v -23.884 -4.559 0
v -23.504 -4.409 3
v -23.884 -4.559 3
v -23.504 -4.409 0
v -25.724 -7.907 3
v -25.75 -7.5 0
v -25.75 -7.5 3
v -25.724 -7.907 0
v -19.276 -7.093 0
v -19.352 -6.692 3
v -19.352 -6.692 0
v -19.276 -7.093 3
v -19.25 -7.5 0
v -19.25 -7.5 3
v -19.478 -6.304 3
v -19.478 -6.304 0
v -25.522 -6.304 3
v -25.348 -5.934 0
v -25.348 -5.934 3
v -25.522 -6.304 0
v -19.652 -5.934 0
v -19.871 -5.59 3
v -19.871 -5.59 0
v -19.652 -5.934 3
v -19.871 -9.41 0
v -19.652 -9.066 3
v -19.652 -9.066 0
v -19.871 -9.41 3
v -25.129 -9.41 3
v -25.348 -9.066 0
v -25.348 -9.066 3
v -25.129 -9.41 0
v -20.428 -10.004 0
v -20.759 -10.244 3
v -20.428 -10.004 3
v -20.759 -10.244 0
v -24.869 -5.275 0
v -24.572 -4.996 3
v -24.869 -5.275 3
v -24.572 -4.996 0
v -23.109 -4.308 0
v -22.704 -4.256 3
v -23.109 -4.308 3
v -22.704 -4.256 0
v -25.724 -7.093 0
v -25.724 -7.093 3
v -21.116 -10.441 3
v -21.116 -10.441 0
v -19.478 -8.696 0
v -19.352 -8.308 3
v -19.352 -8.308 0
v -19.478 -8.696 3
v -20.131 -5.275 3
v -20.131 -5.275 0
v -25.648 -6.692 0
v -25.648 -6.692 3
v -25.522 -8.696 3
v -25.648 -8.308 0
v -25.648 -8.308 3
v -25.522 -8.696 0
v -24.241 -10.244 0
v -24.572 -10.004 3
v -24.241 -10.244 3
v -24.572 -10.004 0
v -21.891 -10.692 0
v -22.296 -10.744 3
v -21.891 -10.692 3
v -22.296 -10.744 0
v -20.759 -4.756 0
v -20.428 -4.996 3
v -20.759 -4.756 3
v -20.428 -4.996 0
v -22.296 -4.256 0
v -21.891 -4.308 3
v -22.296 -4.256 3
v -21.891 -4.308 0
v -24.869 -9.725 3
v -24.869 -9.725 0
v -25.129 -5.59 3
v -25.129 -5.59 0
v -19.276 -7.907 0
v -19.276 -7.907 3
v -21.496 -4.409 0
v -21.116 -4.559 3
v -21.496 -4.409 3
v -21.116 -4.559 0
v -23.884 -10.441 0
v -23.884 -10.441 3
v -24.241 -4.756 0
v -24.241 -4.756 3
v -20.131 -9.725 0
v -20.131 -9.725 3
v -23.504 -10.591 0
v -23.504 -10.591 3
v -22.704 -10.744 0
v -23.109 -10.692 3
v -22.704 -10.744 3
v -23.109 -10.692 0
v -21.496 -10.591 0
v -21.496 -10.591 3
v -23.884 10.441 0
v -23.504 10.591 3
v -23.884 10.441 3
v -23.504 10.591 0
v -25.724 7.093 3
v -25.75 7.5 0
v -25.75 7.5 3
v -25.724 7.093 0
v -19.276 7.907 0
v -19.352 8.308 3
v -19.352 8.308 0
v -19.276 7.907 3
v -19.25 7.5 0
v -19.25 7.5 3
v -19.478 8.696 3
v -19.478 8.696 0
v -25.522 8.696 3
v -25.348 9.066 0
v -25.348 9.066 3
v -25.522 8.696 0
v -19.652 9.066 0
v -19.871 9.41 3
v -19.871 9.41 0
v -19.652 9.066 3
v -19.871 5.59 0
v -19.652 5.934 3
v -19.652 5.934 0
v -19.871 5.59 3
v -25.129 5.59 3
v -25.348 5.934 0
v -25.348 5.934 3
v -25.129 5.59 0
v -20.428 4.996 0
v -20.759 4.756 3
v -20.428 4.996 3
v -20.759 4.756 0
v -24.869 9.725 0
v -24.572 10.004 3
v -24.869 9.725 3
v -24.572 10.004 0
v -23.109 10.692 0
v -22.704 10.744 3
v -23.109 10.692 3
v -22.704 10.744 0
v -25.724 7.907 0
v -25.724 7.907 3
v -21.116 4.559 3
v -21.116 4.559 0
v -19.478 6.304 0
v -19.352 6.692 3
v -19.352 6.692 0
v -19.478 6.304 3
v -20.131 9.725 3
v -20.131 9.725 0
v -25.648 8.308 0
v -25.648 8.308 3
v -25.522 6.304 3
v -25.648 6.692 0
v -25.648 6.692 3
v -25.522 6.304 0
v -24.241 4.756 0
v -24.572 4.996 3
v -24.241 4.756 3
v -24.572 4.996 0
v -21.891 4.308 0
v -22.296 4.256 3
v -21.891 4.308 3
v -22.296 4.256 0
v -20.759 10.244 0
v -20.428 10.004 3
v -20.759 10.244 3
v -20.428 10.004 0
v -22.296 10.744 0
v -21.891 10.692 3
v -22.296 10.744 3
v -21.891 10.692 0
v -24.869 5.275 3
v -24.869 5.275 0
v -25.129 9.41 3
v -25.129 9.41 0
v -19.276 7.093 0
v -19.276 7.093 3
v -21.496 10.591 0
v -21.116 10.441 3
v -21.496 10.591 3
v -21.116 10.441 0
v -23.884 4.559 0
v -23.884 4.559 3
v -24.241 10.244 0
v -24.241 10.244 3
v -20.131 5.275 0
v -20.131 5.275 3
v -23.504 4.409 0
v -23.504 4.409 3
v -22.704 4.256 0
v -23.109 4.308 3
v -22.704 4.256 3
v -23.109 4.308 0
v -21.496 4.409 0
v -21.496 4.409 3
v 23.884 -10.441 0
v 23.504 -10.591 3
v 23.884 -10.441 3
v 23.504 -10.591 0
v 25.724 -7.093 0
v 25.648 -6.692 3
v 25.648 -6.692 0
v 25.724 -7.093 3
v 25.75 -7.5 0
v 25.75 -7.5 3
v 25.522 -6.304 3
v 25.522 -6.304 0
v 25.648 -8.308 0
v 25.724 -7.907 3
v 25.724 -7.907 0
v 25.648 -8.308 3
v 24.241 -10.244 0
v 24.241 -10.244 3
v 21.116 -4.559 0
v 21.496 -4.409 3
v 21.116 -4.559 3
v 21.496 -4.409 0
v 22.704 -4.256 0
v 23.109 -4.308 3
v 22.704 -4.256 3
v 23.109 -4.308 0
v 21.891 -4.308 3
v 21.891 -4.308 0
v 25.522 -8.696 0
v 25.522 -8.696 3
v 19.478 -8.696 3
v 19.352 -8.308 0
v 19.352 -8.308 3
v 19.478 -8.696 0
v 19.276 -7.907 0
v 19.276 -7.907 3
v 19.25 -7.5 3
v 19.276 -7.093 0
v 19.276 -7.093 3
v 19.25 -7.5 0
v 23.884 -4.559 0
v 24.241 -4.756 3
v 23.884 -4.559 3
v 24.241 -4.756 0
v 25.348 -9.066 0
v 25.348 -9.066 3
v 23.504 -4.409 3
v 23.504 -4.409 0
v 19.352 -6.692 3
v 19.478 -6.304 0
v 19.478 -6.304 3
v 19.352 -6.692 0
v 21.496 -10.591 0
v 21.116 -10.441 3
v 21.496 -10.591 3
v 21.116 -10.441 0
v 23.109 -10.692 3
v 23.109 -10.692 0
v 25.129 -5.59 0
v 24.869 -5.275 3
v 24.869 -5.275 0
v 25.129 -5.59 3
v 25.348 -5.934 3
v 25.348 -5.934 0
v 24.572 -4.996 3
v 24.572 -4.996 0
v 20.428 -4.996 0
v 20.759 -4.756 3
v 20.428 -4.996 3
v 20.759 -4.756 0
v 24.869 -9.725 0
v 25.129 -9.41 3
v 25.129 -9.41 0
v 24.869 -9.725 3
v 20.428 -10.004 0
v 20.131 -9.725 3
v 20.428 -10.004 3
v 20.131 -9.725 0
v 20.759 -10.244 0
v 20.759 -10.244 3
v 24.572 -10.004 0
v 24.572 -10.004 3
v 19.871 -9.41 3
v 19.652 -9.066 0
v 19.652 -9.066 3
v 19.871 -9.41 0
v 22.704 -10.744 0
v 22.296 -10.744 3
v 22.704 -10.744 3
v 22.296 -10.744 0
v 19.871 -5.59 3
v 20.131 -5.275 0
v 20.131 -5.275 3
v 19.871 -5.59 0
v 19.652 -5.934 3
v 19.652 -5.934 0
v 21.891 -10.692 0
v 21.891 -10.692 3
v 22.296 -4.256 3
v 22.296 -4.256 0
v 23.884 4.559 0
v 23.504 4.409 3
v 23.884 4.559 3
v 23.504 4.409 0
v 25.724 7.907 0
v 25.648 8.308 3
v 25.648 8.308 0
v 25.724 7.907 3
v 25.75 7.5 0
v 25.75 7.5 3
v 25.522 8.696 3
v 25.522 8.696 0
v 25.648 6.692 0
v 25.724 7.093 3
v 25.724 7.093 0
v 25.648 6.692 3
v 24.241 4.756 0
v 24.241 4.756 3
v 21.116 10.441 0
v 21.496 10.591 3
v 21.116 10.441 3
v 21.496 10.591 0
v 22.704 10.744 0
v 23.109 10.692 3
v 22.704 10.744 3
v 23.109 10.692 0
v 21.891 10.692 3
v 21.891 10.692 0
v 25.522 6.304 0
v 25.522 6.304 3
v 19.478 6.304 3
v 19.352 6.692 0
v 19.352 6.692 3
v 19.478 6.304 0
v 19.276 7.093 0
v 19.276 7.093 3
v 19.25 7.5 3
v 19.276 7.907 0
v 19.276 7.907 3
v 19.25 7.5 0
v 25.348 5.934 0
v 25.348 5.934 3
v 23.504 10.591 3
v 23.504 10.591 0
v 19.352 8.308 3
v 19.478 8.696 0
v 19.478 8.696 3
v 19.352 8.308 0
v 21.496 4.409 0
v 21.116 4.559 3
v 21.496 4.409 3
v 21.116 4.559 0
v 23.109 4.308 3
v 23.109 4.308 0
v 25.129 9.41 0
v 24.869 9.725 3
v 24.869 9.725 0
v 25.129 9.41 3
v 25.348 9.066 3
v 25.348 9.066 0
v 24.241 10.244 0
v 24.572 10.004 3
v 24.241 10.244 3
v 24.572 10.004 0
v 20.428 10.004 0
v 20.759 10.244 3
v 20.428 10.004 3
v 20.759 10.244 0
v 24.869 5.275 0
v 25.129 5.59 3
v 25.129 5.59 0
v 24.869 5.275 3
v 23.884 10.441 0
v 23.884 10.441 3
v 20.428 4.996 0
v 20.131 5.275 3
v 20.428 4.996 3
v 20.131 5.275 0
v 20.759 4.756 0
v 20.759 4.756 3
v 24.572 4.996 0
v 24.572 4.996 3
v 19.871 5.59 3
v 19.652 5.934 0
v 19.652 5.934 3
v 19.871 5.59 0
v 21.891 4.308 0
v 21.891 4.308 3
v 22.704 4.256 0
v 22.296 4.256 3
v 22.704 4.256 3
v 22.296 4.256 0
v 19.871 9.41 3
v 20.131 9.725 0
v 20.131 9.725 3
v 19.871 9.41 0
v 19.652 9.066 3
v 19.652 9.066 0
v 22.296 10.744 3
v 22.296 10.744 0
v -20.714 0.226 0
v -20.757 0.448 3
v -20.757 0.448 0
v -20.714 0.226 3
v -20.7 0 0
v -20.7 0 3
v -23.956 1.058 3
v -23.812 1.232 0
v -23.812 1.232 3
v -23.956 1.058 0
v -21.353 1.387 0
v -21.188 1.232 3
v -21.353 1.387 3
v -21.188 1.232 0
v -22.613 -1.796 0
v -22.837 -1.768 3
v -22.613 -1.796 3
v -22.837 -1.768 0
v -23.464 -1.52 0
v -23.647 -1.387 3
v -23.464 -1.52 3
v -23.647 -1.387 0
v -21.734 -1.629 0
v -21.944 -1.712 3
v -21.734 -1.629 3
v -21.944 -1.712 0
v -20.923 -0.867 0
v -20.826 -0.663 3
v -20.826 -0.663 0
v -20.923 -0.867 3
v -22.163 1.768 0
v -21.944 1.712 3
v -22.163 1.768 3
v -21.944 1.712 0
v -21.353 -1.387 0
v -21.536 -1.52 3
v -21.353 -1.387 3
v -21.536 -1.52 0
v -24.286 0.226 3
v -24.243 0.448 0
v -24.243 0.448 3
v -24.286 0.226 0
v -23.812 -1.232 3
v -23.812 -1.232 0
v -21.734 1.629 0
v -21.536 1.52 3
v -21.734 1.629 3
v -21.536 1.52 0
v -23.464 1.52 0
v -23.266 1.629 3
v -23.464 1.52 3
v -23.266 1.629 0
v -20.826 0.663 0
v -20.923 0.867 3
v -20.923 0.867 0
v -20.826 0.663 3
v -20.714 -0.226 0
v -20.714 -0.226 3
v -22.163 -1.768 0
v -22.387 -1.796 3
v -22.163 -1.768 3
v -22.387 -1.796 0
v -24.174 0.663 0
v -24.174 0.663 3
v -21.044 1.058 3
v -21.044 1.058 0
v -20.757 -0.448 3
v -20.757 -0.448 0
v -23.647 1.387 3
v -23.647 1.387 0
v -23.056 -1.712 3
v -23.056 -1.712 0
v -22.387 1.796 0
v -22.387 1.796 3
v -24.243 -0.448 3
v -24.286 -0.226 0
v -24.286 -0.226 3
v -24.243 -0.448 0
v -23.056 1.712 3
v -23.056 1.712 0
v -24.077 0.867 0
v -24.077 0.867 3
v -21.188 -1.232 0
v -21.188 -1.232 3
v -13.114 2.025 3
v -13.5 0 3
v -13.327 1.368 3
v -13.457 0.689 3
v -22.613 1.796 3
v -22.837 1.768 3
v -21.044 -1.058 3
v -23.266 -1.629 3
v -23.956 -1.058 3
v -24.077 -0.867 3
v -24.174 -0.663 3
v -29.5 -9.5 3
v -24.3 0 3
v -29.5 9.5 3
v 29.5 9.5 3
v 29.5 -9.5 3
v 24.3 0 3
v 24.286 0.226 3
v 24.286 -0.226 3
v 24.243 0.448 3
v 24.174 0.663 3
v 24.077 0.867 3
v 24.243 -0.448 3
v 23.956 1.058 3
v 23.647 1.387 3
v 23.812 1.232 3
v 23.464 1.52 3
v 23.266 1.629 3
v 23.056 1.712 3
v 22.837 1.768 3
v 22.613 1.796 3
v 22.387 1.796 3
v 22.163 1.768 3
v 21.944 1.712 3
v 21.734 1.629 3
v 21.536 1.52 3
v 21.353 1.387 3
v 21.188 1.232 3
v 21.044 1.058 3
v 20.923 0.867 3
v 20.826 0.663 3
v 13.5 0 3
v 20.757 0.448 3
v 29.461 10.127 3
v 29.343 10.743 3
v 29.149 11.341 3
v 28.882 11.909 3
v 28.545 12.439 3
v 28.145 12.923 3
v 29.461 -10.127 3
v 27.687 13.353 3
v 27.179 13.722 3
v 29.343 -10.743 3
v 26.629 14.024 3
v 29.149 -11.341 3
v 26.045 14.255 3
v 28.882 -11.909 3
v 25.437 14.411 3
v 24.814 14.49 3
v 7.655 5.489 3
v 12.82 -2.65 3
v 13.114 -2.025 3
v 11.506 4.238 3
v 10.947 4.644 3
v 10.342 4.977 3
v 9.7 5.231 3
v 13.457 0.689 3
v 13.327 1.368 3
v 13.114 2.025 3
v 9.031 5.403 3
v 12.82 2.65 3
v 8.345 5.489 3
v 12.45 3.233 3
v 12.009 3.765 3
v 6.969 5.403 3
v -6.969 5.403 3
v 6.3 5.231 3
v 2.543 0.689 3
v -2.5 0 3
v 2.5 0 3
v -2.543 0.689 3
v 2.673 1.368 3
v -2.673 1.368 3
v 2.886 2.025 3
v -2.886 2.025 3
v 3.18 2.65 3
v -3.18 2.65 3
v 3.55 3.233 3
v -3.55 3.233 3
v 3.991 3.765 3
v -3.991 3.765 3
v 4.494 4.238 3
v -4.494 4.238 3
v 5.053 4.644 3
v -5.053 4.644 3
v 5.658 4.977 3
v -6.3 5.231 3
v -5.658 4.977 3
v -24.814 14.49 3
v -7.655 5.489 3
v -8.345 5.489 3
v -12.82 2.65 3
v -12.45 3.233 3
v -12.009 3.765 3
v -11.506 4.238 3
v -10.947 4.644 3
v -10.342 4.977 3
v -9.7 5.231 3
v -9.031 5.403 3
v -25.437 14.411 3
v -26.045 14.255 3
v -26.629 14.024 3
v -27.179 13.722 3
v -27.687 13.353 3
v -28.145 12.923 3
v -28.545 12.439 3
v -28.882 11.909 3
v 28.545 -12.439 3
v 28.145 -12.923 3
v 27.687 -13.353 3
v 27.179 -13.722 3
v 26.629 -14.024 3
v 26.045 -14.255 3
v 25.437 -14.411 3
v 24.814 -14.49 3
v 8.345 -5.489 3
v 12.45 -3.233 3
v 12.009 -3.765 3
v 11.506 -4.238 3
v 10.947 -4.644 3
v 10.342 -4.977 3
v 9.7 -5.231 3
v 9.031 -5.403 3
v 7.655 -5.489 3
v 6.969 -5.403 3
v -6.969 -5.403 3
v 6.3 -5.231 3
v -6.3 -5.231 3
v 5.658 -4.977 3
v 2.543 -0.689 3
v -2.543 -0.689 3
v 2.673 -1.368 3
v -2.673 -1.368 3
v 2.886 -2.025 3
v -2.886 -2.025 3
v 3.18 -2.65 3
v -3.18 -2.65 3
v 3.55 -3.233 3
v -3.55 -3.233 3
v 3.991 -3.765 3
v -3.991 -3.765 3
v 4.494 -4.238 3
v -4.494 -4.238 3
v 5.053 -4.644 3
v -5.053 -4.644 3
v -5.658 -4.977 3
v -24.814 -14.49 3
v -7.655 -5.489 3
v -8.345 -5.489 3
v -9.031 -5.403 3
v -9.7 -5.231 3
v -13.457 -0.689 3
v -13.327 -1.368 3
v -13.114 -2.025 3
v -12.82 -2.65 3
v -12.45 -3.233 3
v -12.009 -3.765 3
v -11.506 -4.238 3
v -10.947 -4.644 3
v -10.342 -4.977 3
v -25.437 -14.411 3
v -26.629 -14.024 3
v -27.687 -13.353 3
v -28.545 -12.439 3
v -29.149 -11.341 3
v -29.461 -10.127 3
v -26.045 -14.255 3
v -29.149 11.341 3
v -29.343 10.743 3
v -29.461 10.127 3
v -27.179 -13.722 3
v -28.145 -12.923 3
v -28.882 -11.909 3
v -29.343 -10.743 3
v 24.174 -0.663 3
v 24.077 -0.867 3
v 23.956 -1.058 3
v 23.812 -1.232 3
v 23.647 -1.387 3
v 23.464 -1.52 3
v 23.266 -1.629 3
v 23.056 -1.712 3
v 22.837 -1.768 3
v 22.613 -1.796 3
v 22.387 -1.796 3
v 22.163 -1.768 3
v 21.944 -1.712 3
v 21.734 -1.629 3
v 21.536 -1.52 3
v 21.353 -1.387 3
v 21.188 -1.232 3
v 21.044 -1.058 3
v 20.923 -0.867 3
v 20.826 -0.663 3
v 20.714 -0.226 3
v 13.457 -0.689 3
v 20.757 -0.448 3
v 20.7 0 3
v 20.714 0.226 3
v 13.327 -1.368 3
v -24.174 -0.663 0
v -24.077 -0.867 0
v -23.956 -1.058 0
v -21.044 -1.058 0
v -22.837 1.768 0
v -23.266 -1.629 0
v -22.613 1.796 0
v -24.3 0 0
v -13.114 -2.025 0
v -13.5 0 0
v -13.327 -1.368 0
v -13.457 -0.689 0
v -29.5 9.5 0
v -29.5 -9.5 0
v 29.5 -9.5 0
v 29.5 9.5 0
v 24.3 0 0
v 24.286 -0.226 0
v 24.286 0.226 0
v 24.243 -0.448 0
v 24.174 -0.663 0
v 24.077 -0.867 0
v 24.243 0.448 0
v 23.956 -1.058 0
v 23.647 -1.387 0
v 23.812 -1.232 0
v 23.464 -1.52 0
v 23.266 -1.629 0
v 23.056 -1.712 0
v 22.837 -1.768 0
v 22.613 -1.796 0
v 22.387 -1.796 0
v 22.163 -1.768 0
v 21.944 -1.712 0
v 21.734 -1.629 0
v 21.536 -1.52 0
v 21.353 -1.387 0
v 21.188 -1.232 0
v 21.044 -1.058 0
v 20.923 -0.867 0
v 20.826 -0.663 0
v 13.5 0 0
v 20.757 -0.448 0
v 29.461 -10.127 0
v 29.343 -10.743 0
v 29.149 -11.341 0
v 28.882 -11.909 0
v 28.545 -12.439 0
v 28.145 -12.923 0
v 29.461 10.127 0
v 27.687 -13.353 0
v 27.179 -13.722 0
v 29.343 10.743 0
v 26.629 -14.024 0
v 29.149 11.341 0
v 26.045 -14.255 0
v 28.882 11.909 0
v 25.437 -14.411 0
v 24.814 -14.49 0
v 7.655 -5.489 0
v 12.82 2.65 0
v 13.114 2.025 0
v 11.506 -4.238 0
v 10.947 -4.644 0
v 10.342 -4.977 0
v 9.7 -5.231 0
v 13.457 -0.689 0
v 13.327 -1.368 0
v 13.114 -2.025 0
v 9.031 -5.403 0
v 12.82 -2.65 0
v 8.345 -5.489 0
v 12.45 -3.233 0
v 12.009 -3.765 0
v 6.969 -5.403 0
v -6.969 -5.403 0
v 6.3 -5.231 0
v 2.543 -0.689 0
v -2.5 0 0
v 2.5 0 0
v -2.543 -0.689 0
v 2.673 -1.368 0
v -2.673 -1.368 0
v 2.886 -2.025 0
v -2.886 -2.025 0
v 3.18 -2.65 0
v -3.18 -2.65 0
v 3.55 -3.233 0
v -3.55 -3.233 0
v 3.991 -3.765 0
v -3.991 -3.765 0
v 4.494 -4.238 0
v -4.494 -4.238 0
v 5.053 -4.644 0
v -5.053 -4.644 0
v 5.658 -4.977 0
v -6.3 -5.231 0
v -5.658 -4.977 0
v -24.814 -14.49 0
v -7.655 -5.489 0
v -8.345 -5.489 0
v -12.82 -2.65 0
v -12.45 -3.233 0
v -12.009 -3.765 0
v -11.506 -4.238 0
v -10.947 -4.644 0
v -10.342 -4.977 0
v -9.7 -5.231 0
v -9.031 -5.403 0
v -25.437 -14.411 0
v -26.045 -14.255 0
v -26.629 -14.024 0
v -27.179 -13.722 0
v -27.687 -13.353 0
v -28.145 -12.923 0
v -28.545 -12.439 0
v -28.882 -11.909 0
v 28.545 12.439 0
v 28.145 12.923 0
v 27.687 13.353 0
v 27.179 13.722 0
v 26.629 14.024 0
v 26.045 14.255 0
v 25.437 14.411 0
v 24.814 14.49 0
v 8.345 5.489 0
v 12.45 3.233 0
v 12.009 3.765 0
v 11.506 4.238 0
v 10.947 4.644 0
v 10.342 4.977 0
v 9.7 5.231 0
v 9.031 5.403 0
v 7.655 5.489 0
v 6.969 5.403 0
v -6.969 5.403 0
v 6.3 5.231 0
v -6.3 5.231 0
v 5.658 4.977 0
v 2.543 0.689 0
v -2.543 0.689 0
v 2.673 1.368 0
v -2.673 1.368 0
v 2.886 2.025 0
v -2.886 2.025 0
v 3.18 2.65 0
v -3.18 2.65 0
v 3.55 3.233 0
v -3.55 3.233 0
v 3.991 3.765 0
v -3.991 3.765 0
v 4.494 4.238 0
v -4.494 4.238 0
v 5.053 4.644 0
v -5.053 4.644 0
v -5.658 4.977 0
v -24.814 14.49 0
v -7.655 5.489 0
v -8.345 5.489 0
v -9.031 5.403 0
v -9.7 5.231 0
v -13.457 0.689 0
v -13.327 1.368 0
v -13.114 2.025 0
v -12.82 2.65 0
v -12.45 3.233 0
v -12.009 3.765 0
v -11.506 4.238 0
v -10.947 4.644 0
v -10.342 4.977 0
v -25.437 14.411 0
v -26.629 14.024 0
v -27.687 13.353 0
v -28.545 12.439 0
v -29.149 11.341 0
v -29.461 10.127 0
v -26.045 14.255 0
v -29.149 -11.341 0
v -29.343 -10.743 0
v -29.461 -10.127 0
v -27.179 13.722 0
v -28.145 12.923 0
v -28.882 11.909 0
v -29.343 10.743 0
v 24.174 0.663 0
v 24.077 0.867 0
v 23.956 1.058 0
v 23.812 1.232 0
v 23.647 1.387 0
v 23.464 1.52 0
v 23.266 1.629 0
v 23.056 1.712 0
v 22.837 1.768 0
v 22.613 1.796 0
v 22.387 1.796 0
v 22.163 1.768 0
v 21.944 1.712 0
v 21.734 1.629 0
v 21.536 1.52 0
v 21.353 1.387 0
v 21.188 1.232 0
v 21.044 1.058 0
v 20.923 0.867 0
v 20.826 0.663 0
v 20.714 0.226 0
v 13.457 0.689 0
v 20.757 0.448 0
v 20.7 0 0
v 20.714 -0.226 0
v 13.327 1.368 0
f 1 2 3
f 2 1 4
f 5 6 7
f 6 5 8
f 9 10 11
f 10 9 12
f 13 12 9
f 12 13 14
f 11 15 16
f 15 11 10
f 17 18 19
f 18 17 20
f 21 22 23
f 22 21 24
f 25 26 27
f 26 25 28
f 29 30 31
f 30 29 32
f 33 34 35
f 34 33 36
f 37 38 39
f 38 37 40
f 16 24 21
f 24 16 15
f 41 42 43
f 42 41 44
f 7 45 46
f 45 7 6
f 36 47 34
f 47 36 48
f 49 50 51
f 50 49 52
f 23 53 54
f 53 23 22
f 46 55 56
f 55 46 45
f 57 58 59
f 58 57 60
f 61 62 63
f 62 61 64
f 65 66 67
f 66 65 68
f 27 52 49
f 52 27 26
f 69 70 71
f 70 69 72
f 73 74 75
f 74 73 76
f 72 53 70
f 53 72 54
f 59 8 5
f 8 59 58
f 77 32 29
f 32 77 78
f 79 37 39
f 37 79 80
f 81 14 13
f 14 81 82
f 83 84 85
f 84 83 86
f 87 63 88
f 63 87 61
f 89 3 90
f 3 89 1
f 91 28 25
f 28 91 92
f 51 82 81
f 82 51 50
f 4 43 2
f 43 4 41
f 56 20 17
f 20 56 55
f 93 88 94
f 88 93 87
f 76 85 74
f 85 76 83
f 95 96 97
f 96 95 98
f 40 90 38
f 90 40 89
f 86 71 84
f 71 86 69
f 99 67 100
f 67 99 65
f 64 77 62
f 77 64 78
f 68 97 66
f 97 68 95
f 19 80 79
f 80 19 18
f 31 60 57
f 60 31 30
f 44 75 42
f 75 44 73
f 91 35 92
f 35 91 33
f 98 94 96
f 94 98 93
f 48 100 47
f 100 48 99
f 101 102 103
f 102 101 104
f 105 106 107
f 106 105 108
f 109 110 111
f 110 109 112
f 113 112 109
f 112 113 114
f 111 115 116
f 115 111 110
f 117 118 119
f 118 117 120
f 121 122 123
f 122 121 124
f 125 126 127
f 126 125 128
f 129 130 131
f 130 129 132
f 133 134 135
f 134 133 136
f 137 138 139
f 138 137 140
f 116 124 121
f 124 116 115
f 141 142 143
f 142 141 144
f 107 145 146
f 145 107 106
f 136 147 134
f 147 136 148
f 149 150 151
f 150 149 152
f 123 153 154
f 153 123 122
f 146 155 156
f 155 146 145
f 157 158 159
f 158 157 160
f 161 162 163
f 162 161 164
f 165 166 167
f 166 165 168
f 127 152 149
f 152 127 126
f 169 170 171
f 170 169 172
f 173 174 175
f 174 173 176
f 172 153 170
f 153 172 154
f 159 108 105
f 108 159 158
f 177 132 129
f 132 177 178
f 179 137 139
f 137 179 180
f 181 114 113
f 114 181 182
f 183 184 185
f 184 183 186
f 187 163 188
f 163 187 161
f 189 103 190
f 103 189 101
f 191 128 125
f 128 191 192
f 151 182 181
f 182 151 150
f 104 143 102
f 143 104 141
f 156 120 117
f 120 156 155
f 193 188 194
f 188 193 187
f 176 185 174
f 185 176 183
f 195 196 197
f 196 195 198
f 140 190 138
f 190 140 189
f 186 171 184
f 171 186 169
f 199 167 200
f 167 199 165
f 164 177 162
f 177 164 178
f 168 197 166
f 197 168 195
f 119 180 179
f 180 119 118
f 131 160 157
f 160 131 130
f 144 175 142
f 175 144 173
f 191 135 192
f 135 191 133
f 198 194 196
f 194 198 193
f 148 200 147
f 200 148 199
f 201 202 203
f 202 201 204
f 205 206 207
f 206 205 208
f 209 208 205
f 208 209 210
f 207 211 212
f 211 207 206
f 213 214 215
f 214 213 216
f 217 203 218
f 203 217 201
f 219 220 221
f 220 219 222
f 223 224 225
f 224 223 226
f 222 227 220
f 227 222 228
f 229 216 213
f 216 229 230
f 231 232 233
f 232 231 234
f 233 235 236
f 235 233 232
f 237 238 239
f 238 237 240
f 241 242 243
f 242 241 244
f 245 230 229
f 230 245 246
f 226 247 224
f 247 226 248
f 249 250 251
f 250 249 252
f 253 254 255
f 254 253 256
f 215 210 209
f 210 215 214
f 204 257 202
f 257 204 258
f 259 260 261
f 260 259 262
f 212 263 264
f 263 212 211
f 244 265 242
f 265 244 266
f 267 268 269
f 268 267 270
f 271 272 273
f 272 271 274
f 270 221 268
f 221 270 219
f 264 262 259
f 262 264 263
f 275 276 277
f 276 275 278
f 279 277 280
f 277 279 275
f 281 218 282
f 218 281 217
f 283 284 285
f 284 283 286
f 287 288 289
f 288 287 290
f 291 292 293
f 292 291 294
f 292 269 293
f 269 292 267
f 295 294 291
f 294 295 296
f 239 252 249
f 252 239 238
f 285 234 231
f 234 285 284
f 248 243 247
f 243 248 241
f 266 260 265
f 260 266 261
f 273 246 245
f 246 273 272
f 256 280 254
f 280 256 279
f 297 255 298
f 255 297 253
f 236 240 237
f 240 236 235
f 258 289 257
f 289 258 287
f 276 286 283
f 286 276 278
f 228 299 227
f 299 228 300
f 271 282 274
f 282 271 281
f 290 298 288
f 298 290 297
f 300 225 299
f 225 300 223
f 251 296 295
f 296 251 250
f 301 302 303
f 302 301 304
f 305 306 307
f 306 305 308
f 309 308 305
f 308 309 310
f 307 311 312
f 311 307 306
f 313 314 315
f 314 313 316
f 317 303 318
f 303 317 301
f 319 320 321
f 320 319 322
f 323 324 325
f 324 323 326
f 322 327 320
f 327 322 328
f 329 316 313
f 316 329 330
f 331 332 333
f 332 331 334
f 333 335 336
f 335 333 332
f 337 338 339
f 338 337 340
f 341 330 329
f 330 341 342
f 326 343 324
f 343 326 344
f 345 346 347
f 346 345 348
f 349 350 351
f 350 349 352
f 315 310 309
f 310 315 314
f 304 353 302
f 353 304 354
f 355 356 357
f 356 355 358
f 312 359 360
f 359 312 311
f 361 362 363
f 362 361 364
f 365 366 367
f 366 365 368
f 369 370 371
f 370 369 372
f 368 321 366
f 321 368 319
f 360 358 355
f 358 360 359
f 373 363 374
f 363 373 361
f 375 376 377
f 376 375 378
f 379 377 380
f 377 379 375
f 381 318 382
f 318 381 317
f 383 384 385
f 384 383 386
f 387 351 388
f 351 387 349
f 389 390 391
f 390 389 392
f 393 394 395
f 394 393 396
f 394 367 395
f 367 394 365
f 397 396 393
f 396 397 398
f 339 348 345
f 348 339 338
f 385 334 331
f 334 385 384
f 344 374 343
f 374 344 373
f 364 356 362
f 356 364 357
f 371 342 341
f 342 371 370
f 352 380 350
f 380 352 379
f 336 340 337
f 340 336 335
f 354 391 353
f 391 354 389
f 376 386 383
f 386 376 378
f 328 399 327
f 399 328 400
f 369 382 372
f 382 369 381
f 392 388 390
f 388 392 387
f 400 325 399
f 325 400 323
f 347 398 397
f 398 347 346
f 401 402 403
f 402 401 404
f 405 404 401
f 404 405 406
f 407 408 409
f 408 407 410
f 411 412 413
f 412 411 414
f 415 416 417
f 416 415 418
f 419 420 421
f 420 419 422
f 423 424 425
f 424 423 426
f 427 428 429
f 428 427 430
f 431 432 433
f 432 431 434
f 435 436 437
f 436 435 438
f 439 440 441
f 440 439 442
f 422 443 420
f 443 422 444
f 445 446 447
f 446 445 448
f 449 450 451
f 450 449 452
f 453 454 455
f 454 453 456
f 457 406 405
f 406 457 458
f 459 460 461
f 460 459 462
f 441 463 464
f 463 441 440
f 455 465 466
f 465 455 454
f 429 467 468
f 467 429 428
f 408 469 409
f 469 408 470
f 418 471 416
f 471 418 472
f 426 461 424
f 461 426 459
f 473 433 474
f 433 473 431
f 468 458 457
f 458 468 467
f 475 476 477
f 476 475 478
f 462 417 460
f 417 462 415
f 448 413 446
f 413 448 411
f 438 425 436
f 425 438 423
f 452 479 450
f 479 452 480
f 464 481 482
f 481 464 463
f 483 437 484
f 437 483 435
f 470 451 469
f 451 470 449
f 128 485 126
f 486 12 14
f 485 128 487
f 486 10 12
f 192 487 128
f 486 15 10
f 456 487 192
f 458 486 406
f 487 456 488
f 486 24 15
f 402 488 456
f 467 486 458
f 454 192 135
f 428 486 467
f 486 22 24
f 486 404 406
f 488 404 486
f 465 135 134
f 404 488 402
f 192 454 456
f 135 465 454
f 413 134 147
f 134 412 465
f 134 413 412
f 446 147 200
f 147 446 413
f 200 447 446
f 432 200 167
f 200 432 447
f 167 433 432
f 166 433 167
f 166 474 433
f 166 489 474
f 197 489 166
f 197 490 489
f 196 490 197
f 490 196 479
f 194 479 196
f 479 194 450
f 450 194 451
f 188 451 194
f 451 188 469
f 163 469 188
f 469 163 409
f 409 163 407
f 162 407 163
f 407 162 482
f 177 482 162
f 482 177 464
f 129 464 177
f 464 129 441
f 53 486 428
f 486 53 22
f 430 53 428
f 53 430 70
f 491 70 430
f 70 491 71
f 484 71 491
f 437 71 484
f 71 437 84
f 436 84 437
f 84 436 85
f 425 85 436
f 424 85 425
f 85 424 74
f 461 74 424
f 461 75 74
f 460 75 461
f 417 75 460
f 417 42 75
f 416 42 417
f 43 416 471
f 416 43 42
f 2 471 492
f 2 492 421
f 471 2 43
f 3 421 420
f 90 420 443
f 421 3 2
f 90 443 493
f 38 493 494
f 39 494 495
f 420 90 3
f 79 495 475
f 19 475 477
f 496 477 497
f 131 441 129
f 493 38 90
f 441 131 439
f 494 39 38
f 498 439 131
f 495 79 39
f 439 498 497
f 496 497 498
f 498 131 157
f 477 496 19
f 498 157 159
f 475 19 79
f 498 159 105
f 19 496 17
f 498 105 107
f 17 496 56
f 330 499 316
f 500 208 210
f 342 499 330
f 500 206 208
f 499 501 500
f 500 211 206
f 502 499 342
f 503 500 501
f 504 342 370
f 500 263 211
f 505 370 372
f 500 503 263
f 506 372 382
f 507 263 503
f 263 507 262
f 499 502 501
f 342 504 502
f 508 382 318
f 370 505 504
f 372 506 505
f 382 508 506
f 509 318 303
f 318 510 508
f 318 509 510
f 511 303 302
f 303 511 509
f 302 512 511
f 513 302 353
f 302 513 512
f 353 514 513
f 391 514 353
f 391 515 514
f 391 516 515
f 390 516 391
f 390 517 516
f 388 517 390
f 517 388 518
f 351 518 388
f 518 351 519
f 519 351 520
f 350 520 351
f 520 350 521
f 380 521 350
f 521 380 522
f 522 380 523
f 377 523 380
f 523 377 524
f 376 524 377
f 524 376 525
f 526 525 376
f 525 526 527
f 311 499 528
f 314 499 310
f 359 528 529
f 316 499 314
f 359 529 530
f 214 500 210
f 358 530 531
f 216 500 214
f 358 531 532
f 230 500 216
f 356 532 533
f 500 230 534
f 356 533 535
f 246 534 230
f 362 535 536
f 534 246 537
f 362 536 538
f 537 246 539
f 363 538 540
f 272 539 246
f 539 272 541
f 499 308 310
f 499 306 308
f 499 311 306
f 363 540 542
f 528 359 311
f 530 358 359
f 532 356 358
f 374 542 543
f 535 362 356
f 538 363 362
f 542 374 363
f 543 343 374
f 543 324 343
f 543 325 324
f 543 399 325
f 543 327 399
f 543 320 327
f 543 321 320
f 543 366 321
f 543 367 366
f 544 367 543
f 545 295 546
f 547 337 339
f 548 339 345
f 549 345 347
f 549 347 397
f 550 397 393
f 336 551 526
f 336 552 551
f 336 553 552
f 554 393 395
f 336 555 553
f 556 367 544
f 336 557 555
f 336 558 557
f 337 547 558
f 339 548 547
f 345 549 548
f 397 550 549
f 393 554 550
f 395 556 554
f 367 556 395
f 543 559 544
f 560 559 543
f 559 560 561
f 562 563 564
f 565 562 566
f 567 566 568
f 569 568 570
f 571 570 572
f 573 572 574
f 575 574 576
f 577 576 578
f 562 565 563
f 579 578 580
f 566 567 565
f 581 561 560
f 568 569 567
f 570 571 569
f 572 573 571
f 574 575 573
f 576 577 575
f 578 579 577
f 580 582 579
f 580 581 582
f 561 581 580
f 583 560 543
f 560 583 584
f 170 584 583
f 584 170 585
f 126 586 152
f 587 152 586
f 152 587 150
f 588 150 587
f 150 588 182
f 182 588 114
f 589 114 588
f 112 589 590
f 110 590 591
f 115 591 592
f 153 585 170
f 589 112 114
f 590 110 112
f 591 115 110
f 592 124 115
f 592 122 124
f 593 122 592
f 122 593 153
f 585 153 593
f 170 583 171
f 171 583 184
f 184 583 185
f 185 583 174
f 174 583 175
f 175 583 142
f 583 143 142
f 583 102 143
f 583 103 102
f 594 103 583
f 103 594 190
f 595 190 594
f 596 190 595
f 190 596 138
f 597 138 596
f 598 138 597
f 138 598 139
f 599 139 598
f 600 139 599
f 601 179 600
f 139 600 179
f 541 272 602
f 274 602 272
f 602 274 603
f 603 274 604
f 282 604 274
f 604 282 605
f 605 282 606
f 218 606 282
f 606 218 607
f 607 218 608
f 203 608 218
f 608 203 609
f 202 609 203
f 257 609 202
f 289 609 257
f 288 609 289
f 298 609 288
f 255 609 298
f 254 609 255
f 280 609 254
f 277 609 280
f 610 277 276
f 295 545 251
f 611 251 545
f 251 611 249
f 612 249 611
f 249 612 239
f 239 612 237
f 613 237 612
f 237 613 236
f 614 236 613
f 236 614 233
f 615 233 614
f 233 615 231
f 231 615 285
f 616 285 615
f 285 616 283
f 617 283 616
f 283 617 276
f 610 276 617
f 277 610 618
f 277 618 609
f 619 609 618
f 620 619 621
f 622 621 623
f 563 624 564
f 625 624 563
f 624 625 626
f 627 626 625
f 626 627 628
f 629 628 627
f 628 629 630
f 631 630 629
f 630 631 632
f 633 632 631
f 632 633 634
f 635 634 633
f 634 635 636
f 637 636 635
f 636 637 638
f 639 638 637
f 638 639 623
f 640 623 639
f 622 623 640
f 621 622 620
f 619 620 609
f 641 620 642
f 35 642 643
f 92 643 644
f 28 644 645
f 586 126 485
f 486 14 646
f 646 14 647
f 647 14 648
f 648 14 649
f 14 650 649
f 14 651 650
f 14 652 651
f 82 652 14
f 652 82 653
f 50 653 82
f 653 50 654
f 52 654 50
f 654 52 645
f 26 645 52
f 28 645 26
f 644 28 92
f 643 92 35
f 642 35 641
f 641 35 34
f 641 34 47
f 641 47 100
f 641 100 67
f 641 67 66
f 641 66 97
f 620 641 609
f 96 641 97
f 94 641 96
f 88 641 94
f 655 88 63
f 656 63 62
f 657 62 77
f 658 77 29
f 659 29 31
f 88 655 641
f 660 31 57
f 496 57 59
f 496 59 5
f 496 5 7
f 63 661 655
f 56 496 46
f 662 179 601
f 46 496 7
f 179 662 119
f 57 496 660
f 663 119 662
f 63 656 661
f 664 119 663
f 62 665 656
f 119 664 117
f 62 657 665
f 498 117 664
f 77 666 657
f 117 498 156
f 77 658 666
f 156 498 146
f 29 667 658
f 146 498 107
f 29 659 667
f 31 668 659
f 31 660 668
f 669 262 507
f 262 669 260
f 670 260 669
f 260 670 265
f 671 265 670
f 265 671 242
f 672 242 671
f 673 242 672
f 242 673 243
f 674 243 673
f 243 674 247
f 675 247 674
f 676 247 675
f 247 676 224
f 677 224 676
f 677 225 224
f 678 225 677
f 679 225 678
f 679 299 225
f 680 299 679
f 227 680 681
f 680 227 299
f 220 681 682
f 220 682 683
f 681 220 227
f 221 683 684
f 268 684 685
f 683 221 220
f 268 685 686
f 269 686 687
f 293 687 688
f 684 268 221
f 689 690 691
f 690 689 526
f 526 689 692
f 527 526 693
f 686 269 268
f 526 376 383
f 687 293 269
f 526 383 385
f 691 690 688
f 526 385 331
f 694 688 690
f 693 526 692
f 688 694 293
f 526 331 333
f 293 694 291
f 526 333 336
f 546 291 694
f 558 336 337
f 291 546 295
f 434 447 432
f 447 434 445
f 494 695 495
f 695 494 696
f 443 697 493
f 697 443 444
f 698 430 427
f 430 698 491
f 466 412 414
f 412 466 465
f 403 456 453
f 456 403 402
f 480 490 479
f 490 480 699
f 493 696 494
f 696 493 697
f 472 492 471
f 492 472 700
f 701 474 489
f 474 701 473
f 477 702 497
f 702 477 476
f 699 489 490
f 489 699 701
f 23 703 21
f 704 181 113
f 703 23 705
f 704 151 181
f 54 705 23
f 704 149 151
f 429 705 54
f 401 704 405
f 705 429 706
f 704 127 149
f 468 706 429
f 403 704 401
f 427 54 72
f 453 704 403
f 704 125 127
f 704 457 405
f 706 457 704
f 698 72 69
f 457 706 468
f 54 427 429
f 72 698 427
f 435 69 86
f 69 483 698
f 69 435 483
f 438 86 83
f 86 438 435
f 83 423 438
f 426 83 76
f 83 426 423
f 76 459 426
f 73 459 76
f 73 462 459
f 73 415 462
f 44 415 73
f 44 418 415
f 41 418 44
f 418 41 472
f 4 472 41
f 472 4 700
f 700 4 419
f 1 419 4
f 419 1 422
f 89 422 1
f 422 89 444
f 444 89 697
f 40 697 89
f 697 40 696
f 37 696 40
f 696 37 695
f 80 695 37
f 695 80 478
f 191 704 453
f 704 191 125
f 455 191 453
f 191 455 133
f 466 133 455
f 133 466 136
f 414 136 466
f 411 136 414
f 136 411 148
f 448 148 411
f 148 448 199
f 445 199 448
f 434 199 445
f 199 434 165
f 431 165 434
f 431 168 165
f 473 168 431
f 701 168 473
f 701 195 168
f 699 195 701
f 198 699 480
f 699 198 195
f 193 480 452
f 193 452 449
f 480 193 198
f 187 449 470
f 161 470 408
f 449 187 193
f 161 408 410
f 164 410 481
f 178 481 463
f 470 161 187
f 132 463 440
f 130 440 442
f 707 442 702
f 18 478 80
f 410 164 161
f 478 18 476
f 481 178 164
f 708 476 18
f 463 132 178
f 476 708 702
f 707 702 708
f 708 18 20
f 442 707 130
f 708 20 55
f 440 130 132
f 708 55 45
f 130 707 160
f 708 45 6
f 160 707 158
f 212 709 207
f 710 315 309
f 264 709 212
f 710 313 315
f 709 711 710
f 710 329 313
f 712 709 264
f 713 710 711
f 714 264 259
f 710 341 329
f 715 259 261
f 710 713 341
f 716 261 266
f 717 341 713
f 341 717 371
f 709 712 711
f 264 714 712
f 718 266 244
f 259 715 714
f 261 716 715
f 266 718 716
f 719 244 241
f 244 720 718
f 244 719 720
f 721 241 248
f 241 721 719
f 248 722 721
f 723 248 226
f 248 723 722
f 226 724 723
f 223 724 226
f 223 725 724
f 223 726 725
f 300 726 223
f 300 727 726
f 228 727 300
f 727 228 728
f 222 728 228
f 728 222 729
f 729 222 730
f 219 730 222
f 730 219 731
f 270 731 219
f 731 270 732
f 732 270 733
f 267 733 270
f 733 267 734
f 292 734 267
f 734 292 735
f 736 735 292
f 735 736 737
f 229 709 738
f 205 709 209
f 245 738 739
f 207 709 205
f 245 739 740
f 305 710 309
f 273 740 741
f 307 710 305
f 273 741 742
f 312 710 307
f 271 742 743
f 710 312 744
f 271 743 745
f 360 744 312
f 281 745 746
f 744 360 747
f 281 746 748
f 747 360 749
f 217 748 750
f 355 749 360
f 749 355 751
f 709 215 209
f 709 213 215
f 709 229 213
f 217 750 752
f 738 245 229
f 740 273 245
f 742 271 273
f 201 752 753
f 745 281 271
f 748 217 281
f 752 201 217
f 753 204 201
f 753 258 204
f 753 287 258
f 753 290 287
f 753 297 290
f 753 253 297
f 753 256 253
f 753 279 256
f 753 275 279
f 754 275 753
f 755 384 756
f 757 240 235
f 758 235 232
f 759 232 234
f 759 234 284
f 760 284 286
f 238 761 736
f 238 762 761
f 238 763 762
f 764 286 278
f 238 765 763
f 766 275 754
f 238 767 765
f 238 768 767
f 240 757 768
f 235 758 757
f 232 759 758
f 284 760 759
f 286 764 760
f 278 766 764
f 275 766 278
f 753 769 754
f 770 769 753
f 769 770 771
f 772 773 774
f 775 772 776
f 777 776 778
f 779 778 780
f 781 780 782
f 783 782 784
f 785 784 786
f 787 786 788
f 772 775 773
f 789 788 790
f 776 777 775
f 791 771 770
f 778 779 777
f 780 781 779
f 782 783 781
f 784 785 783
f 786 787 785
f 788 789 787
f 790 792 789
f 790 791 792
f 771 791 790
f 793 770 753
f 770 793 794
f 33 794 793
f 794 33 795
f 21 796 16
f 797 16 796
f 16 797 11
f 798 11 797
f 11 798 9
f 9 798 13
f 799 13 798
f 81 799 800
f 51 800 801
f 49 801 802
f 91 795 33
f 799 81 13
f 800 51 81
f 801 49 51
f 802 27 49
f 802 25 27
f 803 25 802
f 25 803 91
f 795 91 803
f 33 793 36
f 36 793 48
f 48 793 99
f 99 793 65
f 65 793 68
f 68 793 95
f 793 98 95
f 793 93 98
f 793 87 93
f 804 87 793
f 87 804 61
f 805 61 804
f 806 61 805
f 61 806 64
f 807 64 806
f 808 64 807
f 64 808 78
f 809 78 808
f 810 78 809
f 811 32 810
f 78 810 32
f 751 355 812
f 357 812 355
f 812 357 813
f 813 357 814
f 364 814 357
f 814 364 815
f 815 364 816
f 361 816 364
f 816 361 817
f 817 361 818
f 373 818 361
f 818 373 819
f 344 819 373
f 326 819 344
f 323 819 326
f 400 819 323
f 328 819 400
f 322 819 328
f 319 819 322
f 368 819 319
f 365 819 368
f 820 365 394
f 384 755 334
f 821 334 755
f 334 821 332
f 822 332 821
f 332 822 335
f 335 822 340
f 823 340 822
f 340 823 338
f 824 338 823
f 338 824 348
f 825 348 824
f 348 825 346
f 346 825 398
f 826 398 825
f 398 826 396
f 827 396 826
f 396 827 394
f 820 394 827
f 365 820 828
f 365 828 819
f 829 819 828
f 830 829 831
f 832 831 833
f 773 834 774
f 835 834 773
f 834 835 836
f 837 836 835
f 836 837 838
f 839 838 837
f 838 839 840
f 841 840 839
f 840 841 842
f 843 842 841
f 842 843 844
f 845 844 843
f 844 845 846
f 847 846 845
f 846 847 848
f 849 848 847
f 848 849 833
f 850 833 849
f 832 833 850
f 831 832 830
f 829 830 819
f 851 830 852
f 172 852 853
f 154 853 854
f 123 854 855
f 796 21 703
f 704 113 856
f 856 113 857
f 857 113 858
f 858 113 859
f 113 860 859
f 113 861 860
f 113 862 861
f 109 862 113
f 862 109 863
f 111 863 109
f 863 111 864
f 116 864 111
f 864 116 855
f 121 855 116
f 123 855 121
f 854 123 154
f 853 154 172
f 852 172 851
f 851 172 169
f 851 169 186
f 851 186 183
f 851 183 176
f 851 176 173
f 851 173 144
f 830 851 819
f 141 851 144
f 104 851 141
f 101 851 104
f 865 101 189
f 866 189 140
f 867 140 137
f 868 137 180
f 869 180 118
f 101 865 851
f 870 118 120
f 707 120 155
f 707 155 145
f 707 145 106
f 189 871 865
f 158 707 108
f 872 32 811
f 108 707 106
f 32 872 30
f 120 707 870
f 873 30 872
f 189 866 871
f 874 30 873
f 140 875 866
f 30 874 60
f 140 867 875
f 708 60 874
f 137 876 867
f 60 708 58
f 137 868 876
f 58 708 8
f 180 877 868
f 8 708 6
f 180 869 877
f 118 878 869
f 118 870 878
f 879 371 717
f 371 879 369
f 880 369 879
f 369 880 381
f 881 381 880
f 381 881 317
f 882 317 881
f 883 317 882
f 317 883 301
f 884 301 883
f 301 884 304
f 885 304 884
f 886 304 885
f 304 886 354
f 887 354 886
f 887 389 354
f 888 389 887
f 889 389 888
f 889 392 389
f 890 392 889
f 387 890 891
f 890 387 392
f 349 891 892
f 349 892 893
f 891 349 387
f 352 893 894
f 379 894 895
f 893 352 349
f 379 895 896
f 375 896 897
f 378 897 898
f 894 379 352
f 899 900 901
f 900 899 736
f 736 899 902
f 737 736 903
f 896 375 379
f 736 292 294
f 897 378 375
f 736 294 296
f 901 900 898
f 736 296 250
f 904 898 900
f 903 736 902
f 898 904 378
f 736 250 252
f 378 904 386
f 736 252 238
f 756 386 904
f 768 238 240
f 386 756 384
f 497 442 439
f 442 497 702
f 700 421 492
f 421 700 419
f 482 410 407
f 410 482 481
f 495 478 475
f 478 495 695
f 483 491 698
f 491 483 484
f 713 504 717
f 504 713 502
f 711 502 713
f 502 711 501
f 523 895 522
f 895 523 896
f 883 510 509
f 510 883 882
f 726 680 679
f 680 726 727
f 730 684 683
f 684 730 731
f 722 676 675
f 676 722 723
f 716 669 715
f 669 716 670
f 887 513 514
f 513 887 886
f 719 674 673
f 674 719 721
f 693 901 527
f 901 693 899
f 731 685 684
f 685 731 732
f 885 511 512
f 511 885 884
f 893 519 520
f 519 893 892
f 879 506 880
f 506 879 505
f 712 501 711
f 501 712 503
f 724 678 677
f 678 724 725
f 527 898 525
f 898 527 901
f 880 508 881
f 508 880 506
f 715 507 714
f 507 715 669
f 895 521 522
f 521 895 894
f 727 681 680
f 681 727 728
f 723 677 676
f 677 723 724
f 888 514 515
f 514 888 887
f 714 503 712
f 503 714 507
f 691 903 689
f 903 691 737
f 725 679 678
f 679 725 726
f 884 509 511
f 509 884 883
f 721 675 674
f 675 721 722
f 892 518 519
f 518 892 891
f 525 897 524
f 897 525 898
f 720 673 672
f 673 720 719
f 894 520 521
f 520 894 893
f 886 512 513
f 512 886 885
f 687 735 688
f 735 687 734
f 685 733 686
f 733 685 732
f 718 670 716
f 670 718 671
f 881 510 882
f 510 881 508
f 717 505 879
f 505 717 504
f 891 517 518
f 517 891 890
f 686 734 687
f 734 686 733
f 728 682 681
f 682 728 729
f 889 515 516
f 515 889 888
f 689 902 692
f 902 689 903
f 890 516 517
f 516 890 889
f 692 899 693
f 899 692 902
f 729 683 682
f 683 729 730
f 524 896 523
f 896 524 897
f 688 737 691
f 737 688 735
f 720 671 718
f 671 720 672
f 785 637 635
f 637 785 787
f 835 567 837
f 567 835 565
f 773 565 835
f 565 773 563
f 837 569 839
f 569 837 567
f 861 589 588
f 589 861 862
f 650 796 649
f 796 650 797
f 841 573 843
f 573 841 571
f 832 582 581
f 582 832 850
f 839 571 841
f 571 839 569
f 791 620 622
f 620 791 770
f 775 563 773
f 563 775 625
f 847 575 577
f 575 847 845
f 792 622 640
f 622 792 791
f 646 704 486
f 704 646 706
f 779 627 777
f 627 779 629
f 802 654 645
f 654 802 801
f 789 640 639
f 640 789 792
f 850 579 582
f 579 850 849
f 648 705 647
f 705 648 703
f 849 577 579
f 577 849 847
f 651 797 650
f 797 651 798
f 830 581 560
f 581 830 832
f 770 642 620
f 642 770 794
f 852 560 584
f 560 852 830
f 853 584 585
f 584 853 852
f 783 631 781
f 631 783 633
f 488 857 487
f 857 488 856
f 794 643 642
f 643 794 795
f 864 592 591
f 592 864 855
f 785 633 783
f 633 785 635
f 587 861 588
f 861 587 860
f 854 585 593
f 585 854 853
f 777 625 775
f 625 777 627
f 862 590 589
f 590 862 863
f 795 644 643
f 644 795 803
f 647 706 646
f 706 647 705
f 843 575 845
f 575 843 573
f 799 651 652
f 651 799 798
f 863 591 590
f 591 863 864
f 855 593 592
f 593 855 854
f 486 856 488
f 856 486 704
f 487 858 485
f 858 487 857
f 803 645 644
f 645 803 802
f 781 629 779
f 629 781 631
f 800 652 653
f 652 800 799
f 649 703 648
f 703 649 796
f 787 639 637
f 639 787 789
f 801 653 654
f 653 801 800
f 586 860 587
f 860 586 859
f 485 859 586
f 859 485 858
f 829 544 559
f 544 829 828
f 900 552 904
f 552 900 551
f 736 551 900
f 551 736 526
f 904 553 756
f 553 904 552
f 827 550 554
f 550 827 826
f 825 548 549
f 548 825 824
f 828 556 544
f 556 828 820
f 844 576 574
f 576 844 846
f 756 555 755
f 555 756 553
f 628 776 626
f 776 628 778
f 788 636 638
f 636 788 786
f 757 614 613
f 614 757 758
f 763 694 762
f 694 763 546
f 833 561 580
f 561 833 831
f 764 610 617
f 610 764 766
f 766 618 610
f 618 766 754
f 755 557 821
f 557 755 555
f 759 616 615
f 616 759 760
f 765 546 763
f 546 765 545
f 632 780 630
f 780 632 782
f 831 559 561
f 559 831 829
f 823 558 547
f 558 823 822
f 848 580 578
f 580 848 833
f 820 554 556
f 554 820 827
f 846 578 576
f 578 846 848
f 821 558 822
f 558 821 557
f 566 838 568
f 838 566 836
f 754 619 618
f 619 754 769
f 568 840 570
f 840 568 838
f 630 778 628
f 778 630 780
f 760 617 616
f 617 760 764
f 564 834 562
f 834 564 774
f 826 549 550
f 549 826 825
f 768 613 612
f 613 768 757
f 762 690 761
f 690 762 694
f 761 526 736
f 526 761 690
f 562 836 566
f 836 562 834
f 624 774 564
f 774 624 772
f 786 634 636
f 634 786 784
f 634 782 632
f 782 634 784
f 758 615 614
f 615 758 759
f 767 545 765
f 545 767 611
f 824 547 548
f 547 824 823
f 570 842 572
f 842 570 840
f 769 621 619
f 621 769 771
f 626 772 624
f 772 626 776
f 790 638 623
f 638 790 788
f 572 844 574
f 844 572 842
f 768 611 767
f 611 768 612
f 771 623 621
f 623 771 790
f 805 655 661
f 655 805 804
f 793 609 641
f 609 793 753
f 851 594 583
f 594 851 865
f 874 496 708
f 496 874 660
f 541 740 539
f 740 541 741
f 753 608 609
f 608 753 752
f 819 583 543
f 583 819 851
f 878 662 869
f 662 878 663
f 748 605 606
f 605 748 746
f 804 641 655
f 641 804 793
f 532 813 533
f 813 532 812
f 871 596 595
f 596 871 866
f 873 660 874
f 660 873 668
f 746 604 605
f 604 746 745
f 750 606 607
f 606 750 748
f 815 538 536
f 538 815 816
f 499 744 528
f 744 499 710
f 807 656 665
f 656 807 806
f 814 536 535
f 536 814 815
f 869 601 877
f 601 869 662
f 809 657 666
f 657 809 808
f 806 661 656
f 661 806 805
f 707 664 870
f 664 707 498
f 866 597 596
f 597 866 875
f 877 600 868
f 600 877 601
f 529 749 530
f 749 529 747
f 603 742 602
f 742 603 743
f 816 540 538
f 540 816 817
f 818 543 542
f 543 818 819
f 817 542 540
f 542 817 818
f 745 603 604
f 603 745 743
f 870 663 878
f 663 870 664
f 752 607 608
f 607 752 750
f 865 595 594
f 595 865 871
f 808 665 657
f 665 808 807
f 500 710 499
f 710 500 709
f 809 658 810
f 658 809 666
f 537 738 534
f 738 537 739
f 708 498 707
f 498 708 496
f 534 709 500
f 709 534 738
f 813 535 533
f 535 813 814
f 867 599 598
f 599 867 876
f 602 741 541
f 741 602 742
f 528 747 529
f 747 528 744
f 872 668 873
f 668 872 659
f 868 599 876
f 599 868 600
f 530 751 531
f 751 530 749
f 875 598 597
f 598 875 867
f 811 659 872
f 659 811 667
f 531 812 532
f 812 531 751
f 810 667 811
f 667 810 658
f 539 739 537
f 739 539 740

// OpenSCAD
$fn = 50;


difference() {
	union() {
		hull() {
			translate(v = [-24.5000000000, 9.5000000000, 0]) {
				cylinder(h = 3, r = 5);
			}
			translate(v = [24.5000000000, 9.5000000000, 0]) {
				cylinder(h = 3, r = 5);
			}
			translate(v = [-24.5000000000, -9.5000000000, 0]) {
				cylinder(h = 3, r = 5);
			}
			translate(v = [24.5000000000, -9.5000000000, 0]) {
				cylinder(h = 3, r = 5);
			}
		}
	}
	union() {
		#translate(v = [-22.5000000000, -7.5000000000, 0]) {
			cylinder(h = 3, r = 3.2500000000);
		}
		#translate(v = [-22.5000000000, 7.5000000000, 0]) {
			cylinder(h = 3, r = 3.2500000000);
		}
		#translate(v = [22.5000000000, -7.5000000000, 0]) {
			cylinder(h = 3, r = 3.2500000000);
		}
		#translate(v = [22.5000000000, 7.5000000000, 0]) {
			cylinder(h = 3, r = 3.2500000000);
		}
		#translate(v = [-22.5000000000, -7.5000000000, -100.0000000000]) {
			cylinder(h = 200, r = 3.2500000000);
		}
		#translate(v = [-22.5000000000, 7.5000000000, -100.0000000000]) {
			cylinder(h = 200, r = 3.2500000000);
		}
		#translate(v = [22.5000000000, -7.5000000000, -100.0000000000]) {
			cylinder(h = 200, r = 3.2500000000);
		}
		#translate(v = [22.5000000000, 7.5000000000, -100.0000000000]) {
			cylinder(h = 200, r = 3.2500000000);
		}
		#translate(v = [-22.5000000000, -7.5000000000, 0]) {
			cylinder(h = 3, r = 1.8000000000);
		}
		#translate(v = [-22.5000000000, 0.0000000000, 0]) {
			cylinder(h = 3, r = 1.8000000000);
		}
		#translate(v = [-22.5000000000, 7.5000000000, 0]) {
			cylinder(h = 3, r = 1.8000000000);
		}
		#translate(v = [22.5000000000, -7.5000000000, 0]) {
			cylinder(h = 3, r = 1.8000000000);
		}
		#translate(v = [22.5000000000, 0.0000000000, 0]) {
			cylinder(h = 3, r = 1.8000000000);
		}
		#translate(v = [22.5000000000, 7.5000000000, 0]) {
			cylinder(h = 3, r = 1.8000000000);
		}
		#translate(v = [-22.5000000000, -7.5000000000, 0]) {
			cylinder(h = 3, r = 1.8000000000);
		}
		#translate(v = [-22.5000000000, 0.0000000000, 0]) {
			cylinder(h = 3, r = 1.8000000000);
		}
		#translate(v = [-22.5000000000, 7.5000000000, 0]) {
			cylinder(h = 3, r = 1.8000000000);
		}
		#translate(v = [22.5000000000, -7.5000000000, 0]) {
			cylinder(h = 3, r = 1.8000000000);
		}
		#translate(v = [22.5000000000, 0.0000000000, 0]) {
			cylinder(h = 3, r = 1.8000000000);
		}
		#translate(v = [22.5000000000, 7.5000000000, 0]) {
			cylinder(h = 3, r = 1.8000000000);
		}
		#translate(v = [-22.5000000000, -7.5000000000, 0]) {
			cylinder(h = 3, r = 1.8000000000);
		}
		#translate(v = [-22.5000000000, 0.0000000000, 0]) {
			cylinder(h = 3, r = 1.8000000000);
		}
		#translate(v = [-22.5000000000, 7.5000000000, 0]) {
			cylinder(h = 3, r = 1.8000000000);
		}
		#translate(v = [22.5000000000, -7.5000000000, 0]) {
			cylinder(h = 3, r = 1.8000000000);
		}
		#translate(v = [22.5000000000, 0.0000000000, 0]) {
			cylinder(h = 3, r = 1.8000000000);
		}
		#translate(v = [22.5000000000, 7.5000000000, 0]) {
			cylinder(h = 3, r = 1.8000000000);
		}
		#translate(v = [-8.0000000000, 0, 0]) {
			cylinder(h = 3, r = 5.5000000000);
		}
		#translate(v = [8.0000000000, 0, 0]) {
			cylinder(h = 3, r = 5.5000000000);
		}
	}
}
